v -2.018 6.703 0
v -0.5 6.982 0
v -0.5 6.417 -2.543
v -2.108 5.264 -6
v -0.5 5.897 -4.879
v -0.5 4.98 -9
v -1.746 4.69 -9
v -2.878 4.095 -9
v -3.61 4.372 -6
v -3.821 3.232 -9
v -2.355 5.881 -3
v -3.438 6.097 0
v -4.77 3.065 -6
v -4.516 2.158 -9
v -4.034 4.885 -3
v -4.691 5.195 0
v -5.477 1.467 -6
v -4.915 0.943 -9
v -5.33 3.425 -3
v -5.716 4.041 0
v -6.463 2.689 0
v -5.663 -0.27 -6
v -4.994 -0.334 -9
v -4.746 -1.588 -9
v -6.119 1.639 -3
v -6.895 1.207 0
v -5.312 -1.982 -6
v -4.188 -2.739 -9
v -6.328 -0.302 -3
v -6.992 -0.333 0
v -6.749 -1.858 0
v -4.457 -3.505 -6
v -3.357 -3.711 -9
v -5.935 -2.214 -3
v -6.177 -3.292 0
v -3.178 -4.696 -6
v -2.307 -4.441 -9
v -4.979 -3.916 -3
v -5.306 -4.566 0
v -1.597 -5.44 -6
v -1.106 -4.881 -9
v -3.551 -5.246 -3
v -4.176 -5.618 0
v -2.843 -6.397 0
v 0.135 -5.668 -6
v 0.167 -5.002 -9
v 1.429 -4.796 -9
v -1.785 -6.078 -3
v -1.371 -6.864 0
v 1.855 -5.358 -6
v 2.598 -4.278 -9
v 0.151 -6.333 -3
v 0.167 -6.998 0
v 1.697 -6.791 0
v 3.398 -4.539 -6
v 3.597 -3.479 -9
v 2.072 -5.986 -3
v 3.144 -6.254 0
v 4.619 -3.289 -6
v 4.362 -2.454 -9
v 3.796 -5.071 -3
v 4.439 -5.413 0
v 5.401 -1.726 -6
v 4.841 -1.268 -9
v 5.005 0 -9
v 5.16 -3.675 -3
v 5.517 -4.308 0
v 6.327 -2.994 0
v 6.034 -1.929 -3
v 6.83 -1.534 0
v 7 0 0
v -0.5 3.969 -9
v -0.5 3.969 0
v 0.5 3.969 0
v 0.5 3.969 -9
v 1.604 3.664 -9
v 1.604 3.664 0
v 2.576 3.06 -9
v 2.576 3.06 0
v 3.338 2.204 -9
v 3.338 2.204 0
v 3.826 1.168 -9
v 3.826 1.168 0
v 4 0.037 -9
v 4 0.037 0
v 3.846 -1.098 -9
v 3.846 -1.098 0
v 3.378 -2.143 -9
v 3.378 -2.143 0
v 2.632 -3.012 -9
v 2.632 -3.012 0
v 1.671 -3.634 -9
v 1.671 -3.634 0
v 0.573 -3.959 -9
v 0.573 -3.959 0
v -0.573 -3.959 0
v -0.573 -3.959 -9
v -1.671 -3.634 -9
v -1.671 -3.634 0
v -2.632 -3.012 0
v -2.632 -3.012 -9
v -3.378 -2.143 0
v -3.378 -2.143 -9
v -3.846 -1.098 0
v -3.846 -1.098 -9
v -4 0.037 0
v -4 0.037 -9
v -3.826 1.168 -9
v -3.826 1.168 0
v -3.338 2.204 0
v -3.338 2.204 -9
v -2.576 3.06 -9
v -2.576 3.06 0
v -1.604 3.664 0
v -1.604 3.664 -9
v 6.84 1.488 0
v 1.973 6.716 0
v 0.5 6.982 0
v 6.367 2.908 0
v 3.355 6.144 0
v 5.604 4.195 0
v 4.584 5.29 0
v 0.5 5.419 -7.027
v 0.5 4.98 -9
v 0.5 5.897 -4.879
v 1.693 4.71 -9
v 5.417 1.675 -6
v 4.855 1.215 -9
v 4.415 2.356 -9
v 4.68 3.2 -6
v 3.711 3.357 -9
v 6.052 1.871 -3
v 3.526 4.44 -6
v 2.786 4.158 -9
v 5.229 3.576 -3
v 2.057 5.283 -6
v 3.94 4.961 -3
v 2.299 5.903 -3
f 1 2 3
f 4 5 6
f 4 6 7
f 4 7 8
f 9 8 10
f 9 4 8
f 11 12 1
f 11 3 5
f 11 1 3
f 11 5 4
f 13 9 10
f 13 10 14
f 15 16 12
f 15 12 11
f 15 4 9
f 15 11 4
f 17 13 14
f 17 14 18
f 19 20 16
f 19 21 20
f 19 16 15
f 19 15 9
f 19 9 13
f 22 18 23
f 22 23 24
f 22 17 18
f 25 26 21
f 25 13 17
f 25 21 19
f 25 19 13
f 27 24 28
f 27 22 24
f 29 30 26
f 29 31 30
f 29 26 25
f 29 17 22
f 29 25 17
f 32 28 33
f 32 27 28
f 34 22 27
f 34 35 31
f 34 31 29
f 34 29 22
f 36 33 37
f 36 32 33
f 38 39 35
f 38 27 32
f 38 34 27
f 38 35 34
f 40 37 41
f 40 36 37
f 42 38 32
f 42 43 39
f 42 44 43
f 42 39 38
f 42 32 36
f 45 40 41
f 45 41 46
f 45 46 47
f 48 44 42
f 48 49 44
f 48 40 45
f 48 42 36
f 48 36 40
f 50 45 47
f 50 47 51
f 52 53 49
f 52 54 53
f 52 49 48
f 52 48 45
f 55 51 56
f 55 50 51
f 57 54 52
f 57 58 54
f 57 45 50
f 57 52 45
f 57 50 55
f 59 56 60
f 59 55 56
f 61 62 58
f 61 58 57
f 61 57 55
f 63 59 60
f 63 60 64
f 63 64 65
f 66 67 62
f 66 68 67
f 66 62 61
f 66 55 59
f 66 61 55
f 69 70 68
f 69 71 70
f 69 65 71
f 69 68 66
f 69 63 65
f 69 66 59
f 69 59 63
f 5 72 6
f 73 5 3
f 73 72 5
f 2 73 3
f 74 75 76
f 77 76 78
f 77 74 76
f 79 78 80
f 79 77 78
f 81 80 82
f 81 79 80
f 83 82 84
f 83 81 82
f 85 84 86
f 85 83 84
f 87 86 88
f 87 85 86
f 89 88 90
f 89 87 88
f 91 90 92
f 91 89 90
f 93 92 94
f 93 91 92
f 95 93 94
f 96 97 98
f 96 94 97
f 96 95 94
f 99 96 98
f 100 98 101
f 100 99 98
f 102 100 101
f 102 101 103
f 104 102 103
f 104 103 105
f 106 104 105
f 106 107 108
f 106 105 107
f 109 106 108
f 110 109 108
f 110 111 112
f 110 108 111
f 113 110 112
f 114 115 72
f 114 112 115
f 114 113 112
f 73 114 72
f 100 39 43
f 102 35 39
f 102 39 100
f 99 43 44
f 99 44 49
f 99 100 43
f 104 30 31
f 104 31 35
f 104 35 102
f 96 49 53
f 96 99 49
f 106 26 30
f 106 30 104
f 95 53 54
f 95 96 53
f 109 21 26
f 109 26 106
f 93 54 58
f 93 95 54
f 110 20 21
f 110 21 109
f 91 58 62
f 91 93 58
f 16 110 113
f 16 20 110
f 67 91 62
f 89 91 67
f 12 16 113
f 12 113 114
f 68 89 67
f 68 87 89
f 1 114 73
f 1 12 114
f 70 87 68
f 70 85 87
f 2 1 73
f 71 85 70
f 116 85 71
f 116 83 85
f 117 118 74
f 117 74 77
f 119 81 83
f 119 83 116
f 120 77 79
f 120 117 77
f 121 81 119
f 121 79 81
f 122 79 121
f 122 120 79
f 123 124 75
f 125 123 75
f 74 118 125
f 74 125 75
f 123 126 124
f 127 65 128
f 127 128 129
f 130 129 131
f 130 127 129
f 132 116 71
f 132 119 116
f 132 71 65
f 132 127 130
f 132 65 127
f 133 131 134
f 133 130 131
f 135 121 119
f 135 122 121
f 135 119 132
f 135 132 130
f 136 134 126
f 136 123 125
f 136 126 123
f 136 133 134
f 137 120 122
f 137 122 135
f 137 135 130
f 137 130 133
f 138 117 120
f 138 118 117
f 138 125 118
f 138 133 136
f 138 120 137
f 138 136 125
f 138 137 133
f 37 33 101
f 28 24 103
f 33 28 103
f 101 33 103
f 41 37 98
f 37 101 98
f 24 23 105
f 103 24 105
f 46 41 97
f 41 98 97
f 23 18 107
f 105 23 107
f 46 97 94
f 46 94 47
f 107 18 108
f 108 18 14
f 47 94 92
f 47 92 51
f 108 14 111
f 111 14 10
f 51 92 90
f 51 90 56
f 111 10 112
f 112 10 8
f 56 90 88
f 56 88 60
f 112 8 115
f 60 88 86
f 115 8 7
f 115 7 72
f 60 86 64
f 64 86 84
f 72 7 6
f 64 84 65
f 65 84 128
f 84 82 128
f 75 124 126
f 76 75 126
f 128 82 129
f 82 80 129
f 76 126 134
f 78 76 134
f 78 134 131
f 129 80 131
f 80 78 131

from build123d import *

# Parameters (mm, degrees)
ESQUISSE1_R             = 7
BASE_EXTRUSION_DEPTH    = 9
BASE_EXTRUSION_DRAFT    = -12.5
ENL_V_MAT_EXTRU_2_DEPTH = 14.37908816


with BuildPart() as part:
    # Esquisse1 → Base-Extrusion (with draft: the straight prism first)
    with BuildSketch(Plane.XY):
        Circle(ESQUISSE1_R)
    extrude(amount=-BASE_EXTRUSION_DEPTH)
    # Base-Extrusion: the draft: its side faces are tilted about the plane it starts from
    base_extrusion_sides = [part.faces().sort_by_distance(p)[0] for p in [
        (-7, 0, -4.5),
    ]]
    draft(base_extrusion_sides, Plane.XY, BASE_EXTRUSION_DRAFT)

    # Esquisse5 → Enlèv. mat.-Extru.2 (cut, through all)
    with BuildSketch(Plane.XY):
        with BuildLine():
            Line((-0.5, 7.599649669), (0.5, 7.599649669))
            Line((0.5, 7.599649669), (0.5, 3.968626967))
            ThreePointArc((0.5, 3.968626967), (0, -4), (-0.5, 3.968626967))
            Line((-0.5, 3.968626967), (-0.5, 7.599649669))
        make_face()
    extrude(amount=-ENL_V_MAT_EXTRU_2_DEPTH, mode=Mode.SUBTRACT)


solid = part.part
